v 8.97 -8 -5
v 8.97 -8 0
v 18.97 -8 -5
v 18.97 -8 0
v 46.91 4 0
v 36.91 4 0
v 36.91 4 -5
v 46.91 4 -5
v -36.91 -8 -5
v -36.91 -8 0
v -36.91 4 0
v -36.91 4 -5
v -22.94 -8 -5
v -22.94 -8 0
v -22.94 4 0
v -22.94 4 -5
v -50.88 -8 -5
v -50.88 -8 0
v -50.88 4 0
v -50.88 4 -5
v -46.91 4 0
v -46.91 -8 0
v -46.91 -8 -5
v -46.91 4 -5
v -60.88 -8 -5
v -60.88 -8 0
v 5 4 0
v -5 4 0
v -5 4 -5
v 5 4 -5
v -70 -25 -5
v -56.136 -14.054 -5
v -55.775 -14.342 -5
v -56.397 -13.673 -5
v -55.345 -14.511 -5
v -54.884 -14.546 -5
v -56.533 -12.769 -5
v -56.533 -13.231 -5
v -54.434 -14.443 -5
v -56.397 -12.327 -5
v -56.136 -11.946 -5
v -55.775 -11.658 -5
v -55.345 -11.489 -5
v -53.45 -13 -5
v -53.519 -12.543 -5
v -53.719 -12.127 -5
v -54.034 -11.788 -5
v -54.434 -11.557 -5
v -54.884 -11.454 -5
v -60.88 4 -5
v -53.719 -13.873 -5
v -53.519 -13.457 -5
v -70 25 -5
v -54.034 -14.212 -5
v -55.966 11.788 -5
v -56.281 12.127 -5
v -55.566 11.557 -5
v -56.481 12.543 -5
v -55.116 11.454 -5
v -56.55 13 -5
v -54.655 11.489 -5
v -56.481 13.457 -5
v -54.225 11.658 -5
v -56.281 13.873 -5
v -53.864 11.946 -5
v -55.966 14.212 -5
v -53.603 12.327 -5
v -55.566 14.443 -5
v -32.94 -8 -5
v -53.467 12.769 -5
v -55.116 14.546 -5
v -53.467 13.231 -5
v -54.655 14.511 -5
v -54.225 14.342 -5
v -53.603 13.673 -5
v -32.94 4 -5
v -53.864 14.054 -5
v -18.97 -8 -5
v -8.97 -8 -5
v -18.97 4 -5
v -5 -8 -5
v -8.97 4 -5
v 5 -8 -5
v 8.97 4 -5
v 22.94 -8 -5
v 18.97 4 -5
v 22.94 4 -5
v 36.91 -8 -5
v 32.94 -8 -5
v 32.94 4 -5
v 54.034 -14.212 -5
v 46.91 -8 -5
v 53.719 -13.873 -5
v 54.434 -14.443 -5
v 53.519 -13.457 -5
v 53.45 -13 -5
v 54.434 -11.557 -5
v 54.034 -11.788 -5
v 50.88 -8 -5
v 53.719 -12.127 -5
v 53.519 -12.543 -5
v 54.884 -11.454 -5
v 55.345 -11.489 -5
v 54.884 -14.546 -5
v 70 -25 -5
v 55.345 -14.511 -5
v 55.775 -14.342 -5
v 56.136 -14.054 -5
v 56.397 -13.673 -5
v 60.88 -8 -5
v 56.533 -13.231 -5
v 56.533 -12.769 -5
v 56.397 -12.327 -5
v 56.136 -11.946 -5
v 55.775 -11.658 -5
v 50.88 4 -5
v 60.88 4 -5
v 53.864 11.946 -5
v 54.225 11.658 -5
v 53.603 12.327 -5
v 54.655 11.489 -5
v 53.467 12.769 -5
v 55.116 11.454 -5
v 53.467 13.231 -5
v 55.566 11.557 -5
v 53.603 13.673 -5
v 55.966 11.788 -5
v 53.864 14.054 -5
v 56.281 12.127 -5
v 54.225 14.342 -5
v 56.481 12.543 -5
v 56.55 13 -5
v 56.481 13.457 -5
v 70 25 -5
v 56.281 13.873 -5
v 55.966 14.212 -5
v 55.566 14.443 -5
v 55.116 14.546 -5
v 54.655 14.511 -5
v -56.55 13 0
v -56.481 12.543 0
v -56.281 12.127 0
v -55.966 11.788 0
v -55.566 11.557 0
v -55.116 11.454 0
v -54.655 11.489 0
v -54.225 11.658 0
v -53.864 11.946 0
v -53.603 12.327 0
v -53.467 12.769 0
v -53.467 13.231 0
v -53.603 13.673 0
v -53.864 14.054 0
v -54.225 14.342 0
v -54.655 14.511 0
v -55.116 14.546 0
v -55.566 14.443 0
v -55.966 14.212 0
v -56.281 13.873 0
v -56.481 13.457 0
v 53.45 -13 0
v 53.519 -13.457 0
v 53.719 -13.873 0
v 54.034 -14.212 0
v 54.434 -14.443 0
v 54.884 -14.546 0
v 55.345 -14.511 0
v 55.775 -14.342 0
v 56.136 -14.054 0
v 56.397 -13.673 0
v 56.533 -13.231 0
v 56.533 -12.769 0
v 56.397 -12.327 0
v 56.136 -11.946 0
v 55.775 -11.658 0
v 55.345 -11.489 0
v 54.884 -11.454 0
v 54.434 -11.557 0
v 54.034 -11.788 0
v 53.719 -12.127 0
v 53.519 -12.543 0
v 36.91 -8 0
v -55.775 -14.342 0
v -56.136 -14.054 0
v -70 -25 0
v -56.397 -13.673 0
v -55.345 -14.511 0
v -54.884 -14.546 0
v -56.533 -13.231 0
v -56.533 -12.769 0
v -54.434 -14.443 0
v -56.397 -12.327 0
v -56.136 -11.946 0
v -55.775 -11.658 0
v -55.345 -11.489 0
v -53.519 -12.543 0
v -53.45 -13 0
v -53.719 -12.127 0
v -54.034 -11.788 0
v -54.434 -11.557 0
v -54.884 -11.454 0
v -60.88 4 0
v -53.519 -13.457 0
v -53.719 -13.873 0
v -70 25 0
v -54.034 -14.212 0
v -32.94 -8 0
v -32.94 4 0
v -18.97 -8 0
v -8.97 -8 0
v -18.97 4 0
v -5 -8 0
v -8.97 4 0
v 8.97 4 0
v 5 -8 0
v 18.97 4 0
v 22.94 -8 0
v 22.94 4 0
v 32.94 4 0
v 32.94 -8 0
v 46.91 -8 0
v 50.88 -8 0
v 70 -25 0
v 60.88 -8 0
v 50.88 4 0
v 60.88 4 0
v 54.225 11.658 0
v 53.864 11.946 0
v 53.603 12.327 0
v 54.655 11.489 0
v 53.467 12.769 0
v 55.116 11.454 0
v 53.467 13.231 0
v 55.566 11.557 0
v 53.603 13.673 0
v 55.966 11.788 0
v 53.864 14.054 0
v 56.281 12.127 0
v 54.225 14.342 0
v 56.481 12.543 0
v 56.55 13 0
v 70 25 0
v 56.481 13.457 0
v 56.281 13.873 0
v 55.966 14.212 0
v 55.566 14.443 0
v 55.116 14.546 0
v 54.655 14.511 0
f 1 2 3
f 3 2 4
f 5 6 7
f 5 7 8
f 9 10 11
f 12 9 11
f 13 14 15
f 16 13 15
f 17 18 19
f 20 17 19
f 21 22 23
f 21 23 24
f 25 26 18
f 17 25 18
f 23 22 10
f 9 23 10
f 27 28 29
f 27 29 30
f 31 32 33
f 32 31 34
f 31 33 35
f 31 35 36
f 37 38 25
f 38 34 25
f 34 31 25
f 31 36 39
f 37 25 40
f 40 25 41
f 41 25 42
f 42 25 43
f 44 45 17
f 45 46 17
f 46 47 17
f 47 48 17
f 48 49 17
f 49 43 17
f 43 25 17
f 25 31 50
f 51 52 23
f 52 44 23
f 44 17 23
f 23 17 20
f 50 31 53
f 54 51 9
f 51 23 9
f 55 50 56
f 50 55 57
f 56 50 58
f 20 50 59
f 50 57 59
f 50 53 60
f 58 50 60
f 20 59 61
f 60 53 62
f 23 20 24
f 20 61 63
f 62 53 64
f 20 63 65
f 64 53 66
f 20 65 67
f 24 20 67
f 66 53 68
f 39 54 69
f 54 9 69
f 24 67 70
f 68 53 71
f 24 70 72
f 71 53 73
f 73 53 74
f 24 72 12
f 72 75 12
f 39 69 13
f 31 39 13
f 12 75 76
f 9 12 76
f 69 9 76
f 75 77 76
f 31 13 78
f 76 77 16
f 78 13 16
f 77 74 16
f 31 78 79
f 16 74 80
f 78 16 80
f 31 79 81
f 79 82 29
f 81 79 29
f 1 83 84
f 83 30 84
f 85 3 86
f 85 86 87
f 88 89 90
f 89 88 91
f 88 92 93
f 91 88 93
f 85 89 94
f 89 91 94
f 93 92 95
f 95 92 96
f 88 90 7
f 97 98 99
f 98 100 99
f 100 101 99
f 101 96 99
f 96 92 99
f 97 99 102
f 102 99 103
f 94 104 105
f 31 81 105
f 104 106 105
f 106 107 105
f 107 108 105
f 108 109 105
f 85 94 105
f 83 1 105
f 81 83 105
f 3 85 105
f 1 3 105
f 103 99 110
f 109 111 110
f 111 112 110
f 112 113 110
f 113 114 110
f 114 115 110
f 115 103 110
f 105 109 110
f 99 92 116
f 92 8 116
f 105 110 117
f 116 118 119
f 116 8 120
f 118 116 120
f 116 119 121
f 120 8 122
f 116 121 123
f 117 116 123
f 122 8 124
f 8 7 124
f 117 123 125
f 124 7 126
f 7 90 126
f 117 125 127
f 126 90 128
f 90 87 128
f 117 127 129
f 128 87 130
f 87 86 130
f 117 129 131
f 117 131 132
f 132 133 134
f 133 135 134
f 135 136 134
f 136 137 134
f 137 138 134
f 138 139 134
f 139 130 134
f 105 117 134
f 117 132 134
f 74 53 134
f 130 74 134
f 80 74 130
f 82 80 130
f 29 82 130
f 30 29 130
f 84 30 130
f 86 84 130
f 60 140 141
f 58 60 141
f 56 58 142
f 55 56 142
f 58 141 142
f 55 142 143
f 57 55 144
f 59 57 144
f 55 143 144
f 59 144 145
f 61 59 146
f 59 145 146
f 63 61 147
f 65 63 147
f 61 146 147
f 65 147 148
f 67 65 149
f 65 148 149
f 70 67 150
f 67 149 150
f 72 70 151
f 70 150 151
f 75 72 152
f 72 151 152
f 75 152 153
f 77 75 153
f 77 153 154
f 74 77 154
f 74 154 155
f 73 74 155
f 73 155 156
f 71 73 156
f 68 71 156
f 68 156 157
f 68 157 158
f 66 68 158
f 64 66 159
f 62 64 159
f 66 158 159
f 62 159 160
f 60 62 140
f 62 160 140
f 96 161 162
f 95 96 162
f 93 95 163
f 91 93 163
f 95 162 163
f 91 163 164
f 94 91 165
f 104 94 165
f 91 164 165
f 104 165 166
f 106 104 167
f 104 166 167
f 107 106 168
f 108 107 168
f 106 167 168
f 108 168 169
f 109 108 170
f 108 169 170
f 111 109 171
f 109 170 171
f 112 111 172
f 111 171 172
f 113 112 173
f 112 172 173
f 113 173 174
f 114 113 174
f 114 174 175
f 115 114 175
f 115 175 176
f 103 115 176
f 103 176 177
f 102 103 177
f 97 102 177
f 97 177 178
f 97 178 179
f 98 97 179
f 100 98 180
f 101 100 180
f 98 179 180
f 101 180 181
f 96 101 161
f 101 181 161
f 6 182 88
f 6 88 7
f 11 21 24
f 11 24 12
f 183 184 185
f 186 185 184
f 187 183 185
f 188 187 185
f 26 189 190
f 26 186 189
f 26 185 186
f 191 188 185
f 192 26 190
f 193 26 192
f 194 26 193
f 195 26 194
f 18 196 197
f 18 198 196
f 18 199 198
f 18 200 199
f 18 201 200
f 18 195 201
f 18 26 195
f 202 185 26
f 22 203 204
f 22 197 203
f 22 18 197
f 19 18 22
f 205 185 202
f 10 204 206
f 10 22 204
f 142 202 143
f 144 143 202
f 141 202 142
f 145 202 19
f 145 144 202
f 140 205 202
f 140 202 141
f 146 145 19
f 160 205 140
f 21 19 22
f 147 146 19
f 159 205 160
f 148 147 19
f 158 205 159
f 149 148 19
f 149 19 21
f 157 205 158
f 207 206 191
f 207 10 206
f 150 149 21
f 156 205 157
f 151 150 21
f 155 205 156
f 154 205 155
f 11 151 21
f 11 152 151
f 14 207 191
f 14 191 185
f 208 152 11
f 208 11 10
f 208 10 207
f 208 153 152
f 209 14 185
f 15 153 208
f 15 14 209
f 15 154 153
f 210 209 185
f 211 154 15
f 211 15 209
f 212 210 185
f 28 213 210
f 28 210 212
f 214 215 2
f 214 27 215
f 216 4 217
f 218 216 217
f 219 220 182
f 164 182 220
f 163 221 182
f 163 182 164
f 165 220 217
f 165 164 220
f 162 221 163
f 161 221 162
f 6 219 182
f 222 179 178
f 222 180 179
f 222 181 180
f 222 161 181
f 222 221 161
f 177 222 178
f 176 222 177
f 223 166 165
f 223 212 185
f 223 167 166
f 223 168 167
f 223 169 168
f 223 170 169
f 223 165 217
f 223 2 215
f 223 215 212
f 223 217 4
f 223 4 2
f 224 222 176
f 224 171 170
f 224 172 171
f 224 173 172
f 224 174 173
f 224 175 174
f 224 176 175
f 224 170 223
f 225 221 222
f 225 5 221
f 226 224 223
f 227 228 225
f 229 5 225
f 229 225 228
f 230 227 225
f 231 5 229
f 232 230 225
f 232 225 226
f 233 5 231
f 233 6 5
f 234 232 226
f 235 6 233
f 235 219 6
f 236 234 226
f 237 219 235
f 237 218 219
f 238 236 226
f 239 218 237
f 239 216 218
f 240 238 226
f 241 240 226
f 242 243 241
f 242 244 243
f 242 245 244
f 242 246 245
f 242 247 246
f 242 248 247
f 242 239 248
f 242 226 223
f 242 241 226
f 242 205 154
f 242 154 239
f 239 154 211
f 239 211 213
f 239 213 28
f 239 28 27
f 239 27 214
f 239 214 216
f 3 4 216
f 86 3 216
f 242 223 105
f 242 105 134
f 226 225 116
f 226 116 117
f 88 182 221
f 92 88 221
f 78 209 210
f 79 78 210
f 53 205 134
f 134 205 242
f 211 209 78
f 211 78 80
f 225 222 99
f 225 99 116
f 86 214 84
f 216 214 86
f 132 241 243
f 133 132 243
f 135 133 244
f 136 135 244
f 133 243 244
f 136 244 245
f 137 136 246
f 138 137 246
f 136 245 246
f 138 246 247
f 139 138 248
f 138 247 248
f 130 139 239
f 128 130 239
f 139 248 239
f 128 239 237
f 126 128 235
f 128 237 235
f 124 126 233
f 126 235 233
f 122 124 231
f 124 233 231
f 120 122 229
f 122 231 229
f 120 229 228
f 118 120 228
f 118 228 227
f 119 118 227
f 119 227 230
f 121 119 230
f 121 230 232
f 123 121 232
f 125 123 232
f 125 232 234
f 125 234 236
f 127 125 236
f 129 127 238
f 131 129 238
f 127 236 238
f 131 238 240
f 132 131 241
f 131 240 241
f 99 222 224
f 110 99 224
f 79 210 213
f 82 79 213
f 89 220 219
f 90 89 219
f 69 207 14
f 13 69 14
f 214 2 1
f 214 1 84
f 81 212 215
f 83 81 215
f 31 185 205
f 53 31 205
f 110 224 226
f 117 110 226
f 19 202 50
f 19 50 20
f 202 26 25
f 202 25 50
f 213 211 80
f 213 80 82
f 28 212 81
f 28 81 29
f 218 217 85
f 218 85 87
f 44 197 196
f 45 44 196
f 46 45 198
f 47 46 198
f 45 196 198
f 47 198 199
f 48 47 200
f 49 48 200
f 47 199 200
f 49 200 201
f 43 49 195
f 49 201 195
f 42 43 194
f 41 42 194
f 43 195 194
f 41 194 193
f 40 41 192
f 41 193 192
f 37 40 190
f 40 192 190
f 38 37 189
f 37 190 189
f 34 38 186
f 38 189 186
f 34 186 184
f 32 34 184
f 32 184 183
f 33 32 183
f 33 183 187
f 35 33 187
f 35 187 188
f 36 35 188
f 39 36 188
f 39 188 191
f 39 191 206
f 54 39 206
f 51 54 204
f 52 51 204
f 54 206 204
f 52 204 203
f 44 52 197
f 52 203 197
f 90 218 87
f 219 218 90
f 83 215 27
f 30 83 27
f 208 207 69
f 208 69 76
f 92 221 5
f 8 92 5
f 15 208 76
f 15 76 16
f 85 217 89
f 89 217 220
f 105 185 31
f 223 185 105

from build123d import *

# Parameters (mm, degrees)
ESQUISSE1_W        = 140
ESQUISSE1_H        = 50
ESQUISSE1_R        = 1.55
ESQUISSE1_W_2      = 10
ESQUISSE1_H_2      = 12
BOSS_EXTRU_1_DEPTH = 5


with BuildPart() as part:
    # Esquisse1 → Boss.-Extru.1 (new body)
    with BuildSketch(Plane.XY):
        Rectangle(ESQUISSE1_W, ESQUISSE1_H)
        with Locations((-55, -13)):
            Circle(ESQUISSE1_R, mode=Mode.SUBTRACT)
        with Locations(Location((-55, 13, 0), (0, 0, 180))):
            Circle(ESQUISSE1_R, mode=Mode.SUBTRACT)
        with Locations(Location((55, -13, 0), (0, 0, 180))):
            Circle(ESQUISSE1_R, mode=Mode.SUBTRACT)
        with Locations((55, 13)):
            Circle(ESQUISSE1_R, mode=Mode.SUBTRACT)
        with Locations((13.97, -2)):
            Rectangle(ESQUISSE1_W_2, ESQUISSE1_H_2, mode=Mode.SUBTRACT)
        with Locations((0, -2)):
            Rectangle(ESQUISSE1_W_2, ESQUISSE1_H_2, mode=Mode.SUBTRACT)
        with Locations((27.94, -2)):
            Rectangle(ESQUISSE1_W_2, ESQUISSE1_H_2, mode=Mode.SUBTRACT)
        with Locations((41.91, -2)):
            Rectangle(ESQUISSE1_W_2, ESQUISSE1_H_2, mode=Mode.SUBTRACT)
        with Locations((55.88, -2)):
            Rectangle(ESQUISSE1_W_2, ESQUISSE1_H_2, mode=Mode.SUBTRACT)
        with Locations((-13.97, -2)):
            Rectangle(ESQUISSE1_W_2, ESQUISSE1_H_2, mode=Mode.SUBTRACT)
        with Locations((-27.94, -2)):
            Rectangle(ESQUISSE1_W_2, ESQUISSE1_H_2, mode=Mode.SUBTRACT)
        with Locations((-41.91, -2)):
            Rectangle(ESQUISSE1_W_2, ESQUISSE1_H_2, mode=Mode.SUBTRACT)
        with Locations((-55.88, -2)):
            Rectangle(ESQUISSE1_W_2, ESQUISSE1_H_2, mode=Mode.SUBTRACT)
    extrude(amount=-BOSS_EXTRU_1_DEPTH)


solid = part.part
